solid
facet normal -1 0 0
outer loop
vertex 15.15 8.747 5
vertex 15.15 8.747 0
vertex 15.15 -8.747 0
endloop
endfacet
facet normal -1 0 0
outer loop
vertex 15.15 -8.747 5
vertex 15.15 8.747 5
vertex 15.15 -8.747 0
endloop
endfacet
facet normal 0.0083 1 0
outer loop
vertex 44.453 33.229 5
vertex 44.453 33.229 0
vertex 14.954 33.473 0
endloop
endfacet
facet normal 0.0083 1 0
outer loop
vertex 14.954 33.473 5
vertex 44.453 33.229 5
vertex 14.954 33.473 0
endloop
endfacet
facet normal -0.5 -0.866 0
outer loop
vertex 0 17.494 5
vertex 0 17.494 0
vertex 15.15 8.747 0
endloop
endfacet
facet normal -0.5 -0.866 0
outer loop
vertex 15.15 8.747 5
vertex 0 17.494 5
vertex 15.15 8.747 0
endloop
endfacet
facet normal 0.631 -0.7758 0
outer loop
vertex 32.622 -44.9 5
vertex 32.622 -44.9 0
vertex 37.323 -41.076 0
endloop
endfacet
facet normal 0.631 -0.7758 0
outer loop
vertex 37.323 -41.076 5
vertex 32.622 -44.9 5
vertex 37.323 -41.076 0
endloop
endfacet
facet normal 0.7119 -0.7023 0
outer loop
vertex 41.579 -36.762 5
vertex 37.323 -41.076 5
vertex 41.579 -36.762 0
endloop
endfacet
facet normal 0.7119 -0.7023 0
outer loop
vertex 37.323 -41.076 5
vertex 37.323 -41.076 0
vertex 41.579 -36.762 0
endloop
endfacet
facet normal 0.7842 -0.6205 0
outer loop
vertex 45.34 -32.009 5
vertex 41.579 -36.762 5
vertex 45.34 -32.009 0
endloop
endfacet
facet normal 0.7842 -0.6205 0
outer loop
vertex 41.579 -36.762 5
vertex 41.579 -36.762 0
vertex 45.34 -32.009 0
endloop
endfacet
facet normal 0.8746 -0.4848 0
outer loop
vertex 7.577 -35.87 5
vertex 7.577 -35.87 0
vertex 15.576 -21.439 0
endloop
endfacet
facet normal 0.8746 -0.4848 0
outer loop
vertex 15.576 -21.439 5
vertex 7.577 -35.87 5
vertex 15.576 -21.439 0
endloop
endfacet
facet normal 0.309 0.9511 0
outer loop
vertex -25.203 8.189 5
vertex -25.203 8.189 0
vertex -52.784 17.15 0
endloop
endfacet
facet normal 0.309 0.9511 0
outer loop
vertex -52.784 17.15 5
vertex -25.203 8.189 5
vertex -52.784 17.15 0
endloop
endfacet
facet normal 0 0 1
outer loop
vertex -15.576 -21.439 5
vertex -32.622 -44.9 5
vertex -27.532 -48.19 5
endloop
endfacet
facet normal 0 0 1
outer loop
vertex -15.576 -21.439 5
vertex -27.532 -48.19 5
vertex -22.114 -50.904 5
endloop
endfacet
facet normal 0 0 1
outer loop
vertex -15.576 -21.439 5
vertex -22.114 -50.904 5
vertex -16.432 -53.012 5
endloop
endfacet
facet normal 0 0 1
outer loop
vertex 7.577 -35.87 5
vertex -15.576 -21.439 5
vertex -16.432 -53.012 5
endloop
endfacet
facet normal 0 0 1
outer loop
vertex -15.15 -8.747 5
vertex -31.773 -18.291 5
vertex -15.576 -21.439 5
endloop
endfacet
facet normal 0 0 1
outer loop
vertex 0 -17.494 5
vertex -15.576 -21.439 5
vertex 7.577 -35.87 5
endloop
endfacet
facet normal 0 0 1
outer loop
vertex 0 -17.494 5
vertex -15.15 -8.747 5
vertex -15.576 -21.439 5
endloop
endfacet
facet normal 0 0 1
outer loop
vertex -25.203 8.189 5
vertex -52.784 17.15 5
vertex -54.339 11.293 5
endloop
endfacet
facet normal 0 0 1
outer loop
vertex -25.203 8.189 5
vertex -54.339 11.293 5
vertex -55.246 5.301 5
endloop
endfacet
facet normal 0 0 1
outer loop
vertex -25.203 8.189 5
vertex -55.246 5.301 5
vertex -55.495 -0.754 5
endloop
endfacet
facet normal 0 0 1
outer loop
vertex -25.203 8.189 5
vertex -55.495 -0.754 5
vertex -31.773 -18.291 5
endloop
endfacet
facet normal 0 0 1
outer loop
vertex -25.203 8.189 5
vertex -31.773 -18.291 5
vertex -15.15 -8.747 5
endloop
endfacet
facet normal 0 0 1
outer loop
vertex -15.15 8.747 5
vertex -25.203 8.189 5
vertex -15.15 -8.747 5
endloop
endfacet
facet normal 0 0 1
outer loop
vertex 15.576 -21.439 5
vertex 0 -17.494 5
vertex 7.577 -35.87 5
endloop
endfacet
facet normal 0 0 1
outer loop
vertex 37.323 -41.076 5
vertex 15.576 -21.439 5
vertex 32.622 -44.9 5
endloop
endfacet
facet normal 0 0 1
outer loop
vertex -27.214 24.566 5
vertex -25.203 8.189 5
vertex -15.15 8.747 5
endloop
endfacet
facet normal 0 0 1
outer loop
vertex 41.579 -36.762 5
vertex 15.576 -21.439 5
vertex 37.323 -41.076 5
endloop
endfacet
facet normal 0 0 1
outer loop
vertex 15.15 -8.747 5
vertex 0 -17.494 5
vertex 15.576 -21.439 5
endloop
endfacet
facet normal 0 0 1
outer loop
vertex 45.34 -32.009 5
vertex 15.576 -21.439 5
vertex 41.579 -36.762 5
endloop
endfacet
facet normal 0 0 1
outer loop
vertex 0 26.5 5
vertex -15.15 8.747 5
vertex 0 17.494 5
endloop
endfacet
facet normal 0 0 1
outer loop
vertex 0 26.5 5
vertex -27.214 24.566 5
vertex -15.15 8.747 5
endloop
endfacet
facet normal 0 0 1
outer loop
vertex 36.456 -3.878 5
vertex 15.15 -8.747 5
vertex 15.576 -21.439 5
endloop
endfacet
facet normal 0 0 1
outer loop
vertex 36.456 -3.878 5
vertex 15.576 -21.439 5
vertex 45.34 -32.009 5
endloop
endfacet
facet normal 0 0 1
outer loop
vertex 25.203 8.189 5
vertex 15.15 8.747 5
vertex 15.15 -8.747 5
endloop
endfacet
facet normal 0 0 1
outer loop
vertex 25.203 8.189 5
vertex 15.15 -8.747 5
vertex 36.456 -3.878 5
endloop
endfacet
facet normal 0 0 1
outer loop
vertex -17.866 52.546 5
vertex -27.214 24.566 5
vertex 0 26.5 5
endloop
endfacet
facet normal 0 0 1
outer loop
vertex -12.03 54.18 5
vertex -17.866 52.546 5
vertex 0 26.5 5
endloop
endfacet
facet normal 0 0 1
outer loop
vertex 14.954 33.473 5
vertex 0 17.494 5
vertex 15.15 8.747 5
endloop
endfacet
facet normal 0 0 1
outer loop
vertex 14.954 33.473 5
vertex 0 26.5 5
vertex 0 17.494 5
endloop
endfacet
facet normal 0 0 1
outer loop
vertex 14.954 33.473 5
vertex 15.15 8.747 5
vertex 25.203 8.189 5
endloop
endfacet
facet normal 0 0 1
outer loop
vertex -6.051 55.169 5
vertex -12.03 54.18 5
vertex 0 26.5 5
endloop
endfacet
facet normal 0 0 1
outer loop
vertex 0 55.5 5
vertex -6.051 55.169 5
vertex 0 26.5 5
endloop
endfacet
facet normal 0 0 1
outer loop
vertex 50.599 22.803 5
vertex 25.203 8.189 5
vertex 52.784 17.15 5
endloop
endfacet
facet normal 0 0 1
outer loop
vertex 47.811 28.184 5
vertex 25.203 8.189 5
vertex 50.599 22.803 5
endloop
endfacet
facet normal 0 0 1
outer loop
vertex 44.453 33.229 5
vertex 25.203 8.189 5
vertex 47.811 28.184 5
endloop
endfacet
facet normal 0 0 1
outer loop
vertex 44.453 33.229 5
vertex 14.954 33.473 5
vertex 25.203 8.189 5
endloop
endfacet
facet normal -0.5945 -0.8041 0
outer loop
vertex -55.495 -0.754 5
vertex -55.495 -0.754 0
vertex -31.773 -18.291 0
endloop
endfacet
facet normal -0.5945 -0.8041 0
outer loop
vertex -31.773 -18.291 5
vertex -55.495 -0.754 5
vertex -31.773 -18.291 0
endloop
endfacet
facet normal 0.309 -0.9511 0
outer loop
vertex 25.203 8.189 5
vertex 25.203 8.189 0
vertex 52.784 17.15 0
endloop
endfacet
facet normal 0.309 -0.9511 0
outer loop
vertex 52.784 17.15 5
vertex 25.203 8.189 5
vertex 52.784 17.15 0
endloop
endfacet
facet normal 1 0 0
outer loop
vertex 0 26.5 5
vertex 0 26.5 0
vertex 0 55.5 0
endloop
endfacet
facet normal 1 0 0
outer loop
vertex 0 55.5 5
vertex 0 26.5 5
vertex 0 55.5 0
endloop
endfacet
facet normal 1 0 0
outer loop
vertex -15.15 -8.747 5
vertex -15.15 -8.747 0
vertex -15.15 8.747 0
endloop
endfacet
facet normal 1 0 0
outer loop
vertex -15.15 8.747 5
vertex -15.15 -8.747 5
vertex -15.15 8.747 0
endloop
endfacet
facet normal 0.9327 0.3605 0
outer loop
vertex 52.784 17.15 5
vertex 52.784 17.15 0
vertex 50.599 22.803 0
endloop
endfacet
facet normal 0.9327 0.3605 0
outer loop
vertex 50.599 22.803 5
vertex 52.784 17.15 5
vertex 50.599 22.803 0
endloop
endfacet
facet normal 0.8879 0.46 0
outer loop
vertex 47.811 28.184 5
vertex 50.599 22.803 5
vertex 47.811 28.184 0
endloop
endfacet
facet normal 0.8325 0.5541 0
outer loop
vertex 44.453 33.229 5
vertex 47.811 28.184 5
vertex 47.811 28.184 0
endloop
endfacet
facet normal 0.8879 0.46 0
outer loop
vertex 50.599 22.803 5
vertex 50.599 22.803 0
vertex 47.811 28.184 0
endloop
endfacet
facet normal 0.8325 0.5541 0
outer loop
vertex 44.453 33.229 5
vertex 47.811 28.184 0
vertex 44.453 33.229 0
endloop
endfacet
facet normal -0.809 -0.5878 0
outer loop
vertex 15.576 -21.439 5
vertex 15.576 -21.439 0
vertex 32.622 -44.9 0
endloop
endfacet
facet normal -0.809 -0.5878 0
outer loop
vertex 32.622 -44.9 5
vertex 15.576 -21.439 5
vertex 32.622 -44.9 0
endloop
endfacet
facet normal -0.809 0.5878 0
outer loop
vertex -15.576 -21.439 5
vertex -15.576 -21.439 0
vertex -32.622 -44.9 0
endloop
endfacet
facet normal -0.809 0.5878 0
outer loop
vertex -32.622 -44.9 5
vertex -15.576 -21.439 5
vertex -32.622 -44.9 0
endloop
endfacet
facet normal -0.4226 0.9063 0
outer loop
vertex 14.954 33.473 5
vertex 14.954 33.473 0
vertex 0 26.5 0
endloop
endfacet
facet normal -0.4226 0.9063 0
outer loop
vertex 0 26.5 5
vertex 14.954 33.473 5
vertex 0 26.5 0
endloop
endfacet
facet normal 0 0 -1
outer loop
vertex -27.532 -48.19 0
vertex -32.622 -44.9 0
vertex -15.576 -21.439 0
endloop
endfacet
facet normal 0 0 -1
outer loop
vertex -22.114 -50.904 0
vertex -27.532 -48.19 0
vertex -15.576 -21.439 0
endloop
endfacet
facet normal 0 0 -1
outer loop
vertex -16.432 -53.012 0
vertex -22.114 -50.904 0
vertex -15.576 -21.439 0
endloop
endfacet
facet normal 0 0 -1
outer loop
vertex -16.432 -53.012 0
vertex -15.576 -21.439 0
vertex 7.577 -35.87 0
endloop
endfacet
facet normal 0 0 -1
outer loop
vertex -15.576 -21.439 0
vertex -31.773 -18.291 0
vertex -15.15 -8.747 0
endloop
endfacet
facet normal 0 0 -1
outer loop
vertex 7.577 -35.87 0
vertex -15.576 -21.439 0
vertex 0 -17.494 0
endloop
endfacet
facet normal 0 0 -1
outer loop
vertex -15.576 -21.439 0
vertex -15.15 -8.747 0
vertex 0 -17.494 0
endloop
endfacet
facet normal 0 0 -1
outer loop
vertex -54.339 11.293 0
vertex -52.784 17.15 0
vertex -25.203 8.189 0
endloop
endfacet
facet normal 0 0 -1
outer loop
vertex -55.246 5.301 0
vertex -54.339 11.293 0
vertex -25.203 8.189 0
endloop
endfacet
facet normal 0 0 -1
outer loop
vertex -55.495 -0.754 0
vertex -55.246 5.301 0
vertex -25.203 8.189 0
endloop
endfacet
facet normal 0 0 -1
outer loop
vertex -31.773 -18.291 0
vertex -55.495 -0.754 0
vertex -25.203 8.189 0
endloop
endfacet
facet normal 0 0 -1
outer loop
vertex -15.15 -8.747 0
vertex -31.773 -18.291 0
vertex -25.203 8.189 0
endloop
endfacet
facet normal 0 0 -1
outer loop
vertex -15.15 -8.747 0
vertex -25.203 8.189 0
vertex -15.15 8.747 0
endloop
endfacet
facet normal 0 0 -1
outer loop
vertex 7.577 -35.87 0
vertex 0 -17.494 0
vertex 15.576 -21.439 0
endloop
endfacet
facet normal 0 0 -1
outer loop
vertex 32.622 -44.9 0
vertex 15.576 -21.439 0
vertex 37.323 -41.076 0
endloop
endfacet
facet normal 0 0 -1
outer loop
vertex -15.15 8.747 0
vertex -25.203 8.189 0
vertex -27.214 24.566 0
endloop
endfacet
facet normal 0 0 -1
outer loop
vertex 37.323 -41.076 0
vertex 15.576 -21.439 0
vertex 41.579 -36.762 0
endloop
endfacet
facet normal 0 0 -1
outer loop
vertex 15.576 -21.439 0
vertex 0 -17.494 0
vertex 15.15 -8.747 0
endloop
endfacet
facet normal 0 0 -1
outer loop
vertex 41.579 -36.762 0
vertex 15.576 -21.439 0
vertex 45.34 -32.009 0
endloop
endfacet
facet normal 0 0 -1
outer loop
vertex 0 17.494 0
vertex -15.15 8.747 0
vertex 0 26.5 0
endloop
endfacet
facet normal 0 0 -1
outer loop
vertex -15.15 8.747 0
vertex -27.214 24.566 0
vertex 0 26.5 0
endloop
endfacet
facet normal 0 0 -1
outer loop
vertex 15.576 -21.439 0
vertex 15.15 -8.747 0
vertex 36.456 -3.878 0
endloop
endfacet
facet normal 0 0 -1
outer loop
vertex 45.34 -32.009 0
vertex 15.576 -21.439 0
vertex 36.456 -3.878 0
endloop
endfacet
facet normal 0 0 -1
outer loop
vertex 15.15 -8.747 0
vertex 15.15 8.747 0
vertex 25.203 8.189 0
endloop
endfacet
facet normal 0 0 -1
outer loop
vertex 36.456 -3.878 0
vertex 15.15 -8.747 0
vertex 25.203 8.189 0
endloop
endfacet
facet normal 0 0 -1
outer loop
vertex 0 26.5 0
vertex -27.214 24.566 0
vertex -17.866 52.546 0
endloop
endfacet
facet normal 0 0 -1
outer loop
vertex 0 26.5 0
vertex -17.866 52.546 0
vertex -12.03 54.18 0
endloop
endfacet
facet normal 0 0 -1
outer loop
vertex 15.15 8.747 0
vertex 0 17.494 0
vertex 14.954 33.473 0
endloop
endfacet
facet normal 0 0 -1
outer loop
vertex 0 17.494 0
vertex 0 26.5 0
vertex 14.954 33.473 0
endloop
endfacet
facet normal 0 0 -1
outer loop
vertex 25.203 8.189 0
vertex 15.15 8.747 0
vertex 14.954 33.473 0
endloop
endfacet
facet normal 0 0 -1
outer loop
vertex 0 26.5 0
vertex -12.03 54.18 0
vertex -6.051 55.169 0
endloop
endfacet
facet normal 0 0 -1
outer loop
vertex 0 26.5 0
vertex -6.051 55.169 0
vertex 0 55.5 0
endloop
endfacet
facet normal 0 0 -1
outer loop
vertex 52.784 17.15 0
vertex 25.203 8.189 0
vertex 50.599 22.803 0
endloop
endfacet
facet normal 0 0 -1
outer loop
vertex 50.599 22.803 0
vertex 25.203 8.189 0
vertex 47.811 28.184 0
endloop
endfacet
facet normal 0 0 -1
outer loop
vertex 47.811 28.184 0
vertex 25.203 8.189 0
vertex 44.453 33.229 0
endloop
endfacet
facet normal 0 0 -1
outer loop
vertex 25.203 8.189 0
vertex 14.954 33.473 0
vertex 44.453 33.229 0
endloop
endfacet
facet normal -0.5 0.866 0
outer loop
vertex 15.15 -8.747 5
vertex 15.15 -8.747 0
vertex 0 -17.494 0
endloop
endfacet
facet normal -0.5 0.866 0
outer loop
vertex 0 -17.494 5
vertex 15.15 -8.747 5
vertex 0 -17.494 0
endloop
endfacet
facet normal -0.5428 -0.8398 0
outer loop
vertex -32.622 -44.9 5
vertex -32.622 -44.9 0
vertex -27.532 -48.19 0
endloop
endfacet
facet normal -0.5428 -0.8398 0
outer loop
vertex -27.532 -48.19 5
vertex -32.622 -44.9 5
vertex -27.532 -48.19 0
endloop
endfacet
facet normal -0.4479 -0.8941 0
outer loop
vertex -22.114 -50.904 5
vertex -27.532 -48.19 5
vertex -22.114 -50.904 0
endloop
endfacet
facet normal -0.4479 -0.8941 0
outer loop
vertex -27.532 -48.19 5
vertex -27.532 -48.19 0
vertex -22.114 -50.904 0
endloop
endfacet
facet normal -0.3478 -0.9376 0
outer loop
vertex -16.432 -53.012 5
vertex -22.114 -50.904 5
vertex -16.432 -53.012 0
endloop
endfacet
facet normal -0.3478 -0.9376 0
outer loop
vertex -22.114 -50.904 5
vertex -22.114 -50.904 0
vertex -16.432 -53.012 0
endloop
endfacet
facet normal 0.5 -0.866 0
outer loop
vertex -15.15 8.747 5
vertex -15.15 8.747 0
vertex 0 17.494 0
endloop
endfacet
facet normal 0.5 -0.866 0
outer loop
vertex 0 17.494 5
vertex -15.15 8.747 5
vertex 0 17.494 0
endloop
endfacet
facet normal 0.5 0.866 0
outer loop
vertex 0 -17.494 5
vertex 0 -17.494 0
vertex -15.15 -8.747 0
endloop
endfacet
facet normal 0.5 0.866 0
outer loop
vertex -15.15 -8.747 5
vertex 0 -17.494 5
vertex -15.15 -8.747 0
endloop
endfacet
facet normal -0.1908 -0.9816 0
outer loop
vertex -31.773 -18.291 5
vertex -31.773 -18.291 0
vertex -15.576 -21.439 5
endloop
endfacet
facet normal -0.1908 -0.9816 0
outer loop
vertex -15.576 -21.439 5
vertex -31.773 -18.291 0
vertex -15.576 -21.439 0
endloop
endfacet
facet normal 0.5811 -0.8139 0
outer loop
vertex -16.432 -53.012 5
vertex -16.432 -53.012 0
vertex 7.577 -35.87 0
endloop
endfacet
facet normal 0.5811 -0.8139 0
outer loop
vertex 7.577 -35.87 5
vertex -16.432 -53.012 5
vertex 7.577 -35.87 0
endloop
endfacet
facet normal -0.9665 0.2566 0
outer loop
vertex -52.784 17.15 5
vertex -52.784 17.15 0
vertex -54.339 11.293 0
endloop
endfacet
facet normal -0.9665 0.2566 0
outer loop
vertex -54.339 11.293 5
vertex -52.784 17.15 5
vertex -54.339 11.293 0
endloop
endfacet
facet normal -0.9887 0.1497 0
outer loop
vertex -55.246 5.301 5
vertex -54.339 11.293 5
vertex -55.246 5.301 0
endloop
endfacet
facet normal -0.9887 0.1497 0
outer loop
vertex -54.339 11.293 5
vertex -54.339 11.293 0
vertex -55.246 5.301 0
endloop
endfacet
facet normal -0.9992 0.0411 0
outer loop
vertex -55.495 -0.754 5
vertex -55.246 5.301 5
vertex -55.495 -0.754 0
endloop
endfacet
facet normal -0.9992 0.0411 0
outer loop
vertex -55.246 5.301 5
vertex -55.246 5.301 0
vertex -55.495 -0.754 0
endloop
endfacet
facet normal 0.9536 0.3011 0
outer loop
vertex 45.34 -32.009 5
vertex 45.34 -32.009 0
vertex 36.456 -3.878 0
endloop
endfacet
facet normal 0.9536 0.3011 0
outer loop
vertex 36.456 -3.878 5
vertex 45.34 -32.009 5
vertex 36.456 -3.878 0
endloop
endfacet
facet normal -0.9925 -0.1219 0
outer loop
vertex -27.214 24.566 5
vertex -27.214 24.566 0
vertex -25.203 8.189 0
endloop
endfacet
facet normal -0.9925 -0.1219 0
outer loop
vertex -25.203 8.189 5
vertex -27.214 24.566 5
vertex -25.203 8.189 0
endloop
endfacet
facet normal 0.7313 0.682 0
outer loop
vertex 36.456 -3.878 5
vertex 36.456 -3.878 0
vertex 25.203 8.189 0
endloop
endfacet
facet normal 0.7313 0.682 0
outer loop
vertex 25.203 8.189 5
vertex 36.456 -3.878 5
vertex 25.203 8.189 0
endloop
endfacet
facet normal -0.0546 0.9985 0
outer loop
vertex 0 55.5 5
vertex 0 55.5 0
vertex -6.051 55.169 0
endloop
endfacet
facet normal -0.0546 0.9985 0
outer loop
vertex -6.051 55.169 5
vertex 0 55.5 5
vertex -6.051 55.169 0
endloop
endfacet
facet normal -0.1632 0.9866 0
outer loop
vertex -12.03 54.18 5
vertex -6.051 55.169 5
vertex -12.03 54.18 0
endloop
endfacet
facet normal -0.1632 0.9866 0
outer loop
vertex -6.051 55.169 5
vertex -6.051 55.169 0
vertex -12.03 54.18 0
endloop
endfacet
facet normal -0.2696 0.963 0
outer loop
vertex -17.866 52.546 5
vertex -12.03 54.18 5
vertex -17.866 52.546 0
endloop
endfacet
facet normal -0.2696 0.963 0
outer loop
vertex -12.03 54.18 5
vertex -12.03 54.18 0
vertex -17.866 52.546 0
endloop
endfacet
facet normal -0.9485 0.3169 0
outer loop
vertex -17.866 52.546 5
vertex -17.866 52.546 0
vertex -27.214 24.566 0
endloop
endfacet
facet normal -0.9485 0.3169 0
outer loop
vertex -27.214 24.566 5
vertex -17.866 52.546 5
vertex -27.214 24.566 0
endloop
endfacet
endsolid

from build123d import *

# Parameters (mm, degrees)
RESSALTO_EXTRUS_O1_DEPTH = 5


with BuildPart() as part:
    # Esboço1 → Ressalto-extrusão1 (new body)
    with BuildSketch(Plane.XY):
        with BuildLine():
            Line((0, 26.5), (0, 55.5))
            ThreePointArc((0, 55.5), (-9.054313021, 54.756455471), (-17.86602118, 52.545744711))
            Line((-17.86602118, 52.545744711), (-27.213841848, 24.565961853))
            Line((-27.213841848, 24.565961853), (-25.202997682, 8.188950351))
            Line((-25.202997682, 8.188950351), (-52.783636654, 17.150443188))
            ThreePointArc((-52.783636654, 17.150443188), (-54.874420381, 8.309511893), (-55.494877077, -0.754067766))
            Line((-55.494877077, -0.754067766), (-31.773157713, -18.290601927))
            Line((-31.773157713, -18.290601927), (-15.576309186, -21.438950351))
            Line((-15.576309186, -21.438950351), (-32.622081502, -44.900443188))
            ThreePointArc((-32.622081502, -44.900443188), (-24.859943887, -49.620894691), (-16.431699055, -53.01178422))
            Line((-16.431699055, -53.01178422), (7.576950452, -35.870175519))
            Line((7.576950452, -35.870175519), (15.576309186, -21.438950351))
            Line((15.576309186, -21.438950351), (32.622081502, -44.900443188))
            ThreePointArc((32.622081502, -44.900443188), (39.5101301, -38.976911364), (45.339528568, -32.009016686))
            Line((45.339528568, -32.009016686), (36.455970623, -3.878385726))
            Line((36.455970623, -3.878385726), (25.202997682, 8.188950351))
            Line((25.202997682, 8.188950351), (52.783636654, 17.150443188))
            ThreePointArc((52.783636654, 17.150443188), (49.278547189, 25.531838691), (44.453068744, 33.229123961))
            Line((44.453068744, 33.229123961), (14.954078486, 33.473201319))
            Line((14.954078486, 33.473201319), (0, 26.5))
        make_face()
        Polygon((-15.15, 8.746856578), (0, 17.493713156), (15.15, 8.746856578), (15.15, -8.746856578), (0, -17.493713156), (-15.15, -8.746856578), align=None, mode=Mode.SUBTRACT)
    extrude(amount=RESSALTO_EXTRUS_O1_DEPTH)


solid = part.part
